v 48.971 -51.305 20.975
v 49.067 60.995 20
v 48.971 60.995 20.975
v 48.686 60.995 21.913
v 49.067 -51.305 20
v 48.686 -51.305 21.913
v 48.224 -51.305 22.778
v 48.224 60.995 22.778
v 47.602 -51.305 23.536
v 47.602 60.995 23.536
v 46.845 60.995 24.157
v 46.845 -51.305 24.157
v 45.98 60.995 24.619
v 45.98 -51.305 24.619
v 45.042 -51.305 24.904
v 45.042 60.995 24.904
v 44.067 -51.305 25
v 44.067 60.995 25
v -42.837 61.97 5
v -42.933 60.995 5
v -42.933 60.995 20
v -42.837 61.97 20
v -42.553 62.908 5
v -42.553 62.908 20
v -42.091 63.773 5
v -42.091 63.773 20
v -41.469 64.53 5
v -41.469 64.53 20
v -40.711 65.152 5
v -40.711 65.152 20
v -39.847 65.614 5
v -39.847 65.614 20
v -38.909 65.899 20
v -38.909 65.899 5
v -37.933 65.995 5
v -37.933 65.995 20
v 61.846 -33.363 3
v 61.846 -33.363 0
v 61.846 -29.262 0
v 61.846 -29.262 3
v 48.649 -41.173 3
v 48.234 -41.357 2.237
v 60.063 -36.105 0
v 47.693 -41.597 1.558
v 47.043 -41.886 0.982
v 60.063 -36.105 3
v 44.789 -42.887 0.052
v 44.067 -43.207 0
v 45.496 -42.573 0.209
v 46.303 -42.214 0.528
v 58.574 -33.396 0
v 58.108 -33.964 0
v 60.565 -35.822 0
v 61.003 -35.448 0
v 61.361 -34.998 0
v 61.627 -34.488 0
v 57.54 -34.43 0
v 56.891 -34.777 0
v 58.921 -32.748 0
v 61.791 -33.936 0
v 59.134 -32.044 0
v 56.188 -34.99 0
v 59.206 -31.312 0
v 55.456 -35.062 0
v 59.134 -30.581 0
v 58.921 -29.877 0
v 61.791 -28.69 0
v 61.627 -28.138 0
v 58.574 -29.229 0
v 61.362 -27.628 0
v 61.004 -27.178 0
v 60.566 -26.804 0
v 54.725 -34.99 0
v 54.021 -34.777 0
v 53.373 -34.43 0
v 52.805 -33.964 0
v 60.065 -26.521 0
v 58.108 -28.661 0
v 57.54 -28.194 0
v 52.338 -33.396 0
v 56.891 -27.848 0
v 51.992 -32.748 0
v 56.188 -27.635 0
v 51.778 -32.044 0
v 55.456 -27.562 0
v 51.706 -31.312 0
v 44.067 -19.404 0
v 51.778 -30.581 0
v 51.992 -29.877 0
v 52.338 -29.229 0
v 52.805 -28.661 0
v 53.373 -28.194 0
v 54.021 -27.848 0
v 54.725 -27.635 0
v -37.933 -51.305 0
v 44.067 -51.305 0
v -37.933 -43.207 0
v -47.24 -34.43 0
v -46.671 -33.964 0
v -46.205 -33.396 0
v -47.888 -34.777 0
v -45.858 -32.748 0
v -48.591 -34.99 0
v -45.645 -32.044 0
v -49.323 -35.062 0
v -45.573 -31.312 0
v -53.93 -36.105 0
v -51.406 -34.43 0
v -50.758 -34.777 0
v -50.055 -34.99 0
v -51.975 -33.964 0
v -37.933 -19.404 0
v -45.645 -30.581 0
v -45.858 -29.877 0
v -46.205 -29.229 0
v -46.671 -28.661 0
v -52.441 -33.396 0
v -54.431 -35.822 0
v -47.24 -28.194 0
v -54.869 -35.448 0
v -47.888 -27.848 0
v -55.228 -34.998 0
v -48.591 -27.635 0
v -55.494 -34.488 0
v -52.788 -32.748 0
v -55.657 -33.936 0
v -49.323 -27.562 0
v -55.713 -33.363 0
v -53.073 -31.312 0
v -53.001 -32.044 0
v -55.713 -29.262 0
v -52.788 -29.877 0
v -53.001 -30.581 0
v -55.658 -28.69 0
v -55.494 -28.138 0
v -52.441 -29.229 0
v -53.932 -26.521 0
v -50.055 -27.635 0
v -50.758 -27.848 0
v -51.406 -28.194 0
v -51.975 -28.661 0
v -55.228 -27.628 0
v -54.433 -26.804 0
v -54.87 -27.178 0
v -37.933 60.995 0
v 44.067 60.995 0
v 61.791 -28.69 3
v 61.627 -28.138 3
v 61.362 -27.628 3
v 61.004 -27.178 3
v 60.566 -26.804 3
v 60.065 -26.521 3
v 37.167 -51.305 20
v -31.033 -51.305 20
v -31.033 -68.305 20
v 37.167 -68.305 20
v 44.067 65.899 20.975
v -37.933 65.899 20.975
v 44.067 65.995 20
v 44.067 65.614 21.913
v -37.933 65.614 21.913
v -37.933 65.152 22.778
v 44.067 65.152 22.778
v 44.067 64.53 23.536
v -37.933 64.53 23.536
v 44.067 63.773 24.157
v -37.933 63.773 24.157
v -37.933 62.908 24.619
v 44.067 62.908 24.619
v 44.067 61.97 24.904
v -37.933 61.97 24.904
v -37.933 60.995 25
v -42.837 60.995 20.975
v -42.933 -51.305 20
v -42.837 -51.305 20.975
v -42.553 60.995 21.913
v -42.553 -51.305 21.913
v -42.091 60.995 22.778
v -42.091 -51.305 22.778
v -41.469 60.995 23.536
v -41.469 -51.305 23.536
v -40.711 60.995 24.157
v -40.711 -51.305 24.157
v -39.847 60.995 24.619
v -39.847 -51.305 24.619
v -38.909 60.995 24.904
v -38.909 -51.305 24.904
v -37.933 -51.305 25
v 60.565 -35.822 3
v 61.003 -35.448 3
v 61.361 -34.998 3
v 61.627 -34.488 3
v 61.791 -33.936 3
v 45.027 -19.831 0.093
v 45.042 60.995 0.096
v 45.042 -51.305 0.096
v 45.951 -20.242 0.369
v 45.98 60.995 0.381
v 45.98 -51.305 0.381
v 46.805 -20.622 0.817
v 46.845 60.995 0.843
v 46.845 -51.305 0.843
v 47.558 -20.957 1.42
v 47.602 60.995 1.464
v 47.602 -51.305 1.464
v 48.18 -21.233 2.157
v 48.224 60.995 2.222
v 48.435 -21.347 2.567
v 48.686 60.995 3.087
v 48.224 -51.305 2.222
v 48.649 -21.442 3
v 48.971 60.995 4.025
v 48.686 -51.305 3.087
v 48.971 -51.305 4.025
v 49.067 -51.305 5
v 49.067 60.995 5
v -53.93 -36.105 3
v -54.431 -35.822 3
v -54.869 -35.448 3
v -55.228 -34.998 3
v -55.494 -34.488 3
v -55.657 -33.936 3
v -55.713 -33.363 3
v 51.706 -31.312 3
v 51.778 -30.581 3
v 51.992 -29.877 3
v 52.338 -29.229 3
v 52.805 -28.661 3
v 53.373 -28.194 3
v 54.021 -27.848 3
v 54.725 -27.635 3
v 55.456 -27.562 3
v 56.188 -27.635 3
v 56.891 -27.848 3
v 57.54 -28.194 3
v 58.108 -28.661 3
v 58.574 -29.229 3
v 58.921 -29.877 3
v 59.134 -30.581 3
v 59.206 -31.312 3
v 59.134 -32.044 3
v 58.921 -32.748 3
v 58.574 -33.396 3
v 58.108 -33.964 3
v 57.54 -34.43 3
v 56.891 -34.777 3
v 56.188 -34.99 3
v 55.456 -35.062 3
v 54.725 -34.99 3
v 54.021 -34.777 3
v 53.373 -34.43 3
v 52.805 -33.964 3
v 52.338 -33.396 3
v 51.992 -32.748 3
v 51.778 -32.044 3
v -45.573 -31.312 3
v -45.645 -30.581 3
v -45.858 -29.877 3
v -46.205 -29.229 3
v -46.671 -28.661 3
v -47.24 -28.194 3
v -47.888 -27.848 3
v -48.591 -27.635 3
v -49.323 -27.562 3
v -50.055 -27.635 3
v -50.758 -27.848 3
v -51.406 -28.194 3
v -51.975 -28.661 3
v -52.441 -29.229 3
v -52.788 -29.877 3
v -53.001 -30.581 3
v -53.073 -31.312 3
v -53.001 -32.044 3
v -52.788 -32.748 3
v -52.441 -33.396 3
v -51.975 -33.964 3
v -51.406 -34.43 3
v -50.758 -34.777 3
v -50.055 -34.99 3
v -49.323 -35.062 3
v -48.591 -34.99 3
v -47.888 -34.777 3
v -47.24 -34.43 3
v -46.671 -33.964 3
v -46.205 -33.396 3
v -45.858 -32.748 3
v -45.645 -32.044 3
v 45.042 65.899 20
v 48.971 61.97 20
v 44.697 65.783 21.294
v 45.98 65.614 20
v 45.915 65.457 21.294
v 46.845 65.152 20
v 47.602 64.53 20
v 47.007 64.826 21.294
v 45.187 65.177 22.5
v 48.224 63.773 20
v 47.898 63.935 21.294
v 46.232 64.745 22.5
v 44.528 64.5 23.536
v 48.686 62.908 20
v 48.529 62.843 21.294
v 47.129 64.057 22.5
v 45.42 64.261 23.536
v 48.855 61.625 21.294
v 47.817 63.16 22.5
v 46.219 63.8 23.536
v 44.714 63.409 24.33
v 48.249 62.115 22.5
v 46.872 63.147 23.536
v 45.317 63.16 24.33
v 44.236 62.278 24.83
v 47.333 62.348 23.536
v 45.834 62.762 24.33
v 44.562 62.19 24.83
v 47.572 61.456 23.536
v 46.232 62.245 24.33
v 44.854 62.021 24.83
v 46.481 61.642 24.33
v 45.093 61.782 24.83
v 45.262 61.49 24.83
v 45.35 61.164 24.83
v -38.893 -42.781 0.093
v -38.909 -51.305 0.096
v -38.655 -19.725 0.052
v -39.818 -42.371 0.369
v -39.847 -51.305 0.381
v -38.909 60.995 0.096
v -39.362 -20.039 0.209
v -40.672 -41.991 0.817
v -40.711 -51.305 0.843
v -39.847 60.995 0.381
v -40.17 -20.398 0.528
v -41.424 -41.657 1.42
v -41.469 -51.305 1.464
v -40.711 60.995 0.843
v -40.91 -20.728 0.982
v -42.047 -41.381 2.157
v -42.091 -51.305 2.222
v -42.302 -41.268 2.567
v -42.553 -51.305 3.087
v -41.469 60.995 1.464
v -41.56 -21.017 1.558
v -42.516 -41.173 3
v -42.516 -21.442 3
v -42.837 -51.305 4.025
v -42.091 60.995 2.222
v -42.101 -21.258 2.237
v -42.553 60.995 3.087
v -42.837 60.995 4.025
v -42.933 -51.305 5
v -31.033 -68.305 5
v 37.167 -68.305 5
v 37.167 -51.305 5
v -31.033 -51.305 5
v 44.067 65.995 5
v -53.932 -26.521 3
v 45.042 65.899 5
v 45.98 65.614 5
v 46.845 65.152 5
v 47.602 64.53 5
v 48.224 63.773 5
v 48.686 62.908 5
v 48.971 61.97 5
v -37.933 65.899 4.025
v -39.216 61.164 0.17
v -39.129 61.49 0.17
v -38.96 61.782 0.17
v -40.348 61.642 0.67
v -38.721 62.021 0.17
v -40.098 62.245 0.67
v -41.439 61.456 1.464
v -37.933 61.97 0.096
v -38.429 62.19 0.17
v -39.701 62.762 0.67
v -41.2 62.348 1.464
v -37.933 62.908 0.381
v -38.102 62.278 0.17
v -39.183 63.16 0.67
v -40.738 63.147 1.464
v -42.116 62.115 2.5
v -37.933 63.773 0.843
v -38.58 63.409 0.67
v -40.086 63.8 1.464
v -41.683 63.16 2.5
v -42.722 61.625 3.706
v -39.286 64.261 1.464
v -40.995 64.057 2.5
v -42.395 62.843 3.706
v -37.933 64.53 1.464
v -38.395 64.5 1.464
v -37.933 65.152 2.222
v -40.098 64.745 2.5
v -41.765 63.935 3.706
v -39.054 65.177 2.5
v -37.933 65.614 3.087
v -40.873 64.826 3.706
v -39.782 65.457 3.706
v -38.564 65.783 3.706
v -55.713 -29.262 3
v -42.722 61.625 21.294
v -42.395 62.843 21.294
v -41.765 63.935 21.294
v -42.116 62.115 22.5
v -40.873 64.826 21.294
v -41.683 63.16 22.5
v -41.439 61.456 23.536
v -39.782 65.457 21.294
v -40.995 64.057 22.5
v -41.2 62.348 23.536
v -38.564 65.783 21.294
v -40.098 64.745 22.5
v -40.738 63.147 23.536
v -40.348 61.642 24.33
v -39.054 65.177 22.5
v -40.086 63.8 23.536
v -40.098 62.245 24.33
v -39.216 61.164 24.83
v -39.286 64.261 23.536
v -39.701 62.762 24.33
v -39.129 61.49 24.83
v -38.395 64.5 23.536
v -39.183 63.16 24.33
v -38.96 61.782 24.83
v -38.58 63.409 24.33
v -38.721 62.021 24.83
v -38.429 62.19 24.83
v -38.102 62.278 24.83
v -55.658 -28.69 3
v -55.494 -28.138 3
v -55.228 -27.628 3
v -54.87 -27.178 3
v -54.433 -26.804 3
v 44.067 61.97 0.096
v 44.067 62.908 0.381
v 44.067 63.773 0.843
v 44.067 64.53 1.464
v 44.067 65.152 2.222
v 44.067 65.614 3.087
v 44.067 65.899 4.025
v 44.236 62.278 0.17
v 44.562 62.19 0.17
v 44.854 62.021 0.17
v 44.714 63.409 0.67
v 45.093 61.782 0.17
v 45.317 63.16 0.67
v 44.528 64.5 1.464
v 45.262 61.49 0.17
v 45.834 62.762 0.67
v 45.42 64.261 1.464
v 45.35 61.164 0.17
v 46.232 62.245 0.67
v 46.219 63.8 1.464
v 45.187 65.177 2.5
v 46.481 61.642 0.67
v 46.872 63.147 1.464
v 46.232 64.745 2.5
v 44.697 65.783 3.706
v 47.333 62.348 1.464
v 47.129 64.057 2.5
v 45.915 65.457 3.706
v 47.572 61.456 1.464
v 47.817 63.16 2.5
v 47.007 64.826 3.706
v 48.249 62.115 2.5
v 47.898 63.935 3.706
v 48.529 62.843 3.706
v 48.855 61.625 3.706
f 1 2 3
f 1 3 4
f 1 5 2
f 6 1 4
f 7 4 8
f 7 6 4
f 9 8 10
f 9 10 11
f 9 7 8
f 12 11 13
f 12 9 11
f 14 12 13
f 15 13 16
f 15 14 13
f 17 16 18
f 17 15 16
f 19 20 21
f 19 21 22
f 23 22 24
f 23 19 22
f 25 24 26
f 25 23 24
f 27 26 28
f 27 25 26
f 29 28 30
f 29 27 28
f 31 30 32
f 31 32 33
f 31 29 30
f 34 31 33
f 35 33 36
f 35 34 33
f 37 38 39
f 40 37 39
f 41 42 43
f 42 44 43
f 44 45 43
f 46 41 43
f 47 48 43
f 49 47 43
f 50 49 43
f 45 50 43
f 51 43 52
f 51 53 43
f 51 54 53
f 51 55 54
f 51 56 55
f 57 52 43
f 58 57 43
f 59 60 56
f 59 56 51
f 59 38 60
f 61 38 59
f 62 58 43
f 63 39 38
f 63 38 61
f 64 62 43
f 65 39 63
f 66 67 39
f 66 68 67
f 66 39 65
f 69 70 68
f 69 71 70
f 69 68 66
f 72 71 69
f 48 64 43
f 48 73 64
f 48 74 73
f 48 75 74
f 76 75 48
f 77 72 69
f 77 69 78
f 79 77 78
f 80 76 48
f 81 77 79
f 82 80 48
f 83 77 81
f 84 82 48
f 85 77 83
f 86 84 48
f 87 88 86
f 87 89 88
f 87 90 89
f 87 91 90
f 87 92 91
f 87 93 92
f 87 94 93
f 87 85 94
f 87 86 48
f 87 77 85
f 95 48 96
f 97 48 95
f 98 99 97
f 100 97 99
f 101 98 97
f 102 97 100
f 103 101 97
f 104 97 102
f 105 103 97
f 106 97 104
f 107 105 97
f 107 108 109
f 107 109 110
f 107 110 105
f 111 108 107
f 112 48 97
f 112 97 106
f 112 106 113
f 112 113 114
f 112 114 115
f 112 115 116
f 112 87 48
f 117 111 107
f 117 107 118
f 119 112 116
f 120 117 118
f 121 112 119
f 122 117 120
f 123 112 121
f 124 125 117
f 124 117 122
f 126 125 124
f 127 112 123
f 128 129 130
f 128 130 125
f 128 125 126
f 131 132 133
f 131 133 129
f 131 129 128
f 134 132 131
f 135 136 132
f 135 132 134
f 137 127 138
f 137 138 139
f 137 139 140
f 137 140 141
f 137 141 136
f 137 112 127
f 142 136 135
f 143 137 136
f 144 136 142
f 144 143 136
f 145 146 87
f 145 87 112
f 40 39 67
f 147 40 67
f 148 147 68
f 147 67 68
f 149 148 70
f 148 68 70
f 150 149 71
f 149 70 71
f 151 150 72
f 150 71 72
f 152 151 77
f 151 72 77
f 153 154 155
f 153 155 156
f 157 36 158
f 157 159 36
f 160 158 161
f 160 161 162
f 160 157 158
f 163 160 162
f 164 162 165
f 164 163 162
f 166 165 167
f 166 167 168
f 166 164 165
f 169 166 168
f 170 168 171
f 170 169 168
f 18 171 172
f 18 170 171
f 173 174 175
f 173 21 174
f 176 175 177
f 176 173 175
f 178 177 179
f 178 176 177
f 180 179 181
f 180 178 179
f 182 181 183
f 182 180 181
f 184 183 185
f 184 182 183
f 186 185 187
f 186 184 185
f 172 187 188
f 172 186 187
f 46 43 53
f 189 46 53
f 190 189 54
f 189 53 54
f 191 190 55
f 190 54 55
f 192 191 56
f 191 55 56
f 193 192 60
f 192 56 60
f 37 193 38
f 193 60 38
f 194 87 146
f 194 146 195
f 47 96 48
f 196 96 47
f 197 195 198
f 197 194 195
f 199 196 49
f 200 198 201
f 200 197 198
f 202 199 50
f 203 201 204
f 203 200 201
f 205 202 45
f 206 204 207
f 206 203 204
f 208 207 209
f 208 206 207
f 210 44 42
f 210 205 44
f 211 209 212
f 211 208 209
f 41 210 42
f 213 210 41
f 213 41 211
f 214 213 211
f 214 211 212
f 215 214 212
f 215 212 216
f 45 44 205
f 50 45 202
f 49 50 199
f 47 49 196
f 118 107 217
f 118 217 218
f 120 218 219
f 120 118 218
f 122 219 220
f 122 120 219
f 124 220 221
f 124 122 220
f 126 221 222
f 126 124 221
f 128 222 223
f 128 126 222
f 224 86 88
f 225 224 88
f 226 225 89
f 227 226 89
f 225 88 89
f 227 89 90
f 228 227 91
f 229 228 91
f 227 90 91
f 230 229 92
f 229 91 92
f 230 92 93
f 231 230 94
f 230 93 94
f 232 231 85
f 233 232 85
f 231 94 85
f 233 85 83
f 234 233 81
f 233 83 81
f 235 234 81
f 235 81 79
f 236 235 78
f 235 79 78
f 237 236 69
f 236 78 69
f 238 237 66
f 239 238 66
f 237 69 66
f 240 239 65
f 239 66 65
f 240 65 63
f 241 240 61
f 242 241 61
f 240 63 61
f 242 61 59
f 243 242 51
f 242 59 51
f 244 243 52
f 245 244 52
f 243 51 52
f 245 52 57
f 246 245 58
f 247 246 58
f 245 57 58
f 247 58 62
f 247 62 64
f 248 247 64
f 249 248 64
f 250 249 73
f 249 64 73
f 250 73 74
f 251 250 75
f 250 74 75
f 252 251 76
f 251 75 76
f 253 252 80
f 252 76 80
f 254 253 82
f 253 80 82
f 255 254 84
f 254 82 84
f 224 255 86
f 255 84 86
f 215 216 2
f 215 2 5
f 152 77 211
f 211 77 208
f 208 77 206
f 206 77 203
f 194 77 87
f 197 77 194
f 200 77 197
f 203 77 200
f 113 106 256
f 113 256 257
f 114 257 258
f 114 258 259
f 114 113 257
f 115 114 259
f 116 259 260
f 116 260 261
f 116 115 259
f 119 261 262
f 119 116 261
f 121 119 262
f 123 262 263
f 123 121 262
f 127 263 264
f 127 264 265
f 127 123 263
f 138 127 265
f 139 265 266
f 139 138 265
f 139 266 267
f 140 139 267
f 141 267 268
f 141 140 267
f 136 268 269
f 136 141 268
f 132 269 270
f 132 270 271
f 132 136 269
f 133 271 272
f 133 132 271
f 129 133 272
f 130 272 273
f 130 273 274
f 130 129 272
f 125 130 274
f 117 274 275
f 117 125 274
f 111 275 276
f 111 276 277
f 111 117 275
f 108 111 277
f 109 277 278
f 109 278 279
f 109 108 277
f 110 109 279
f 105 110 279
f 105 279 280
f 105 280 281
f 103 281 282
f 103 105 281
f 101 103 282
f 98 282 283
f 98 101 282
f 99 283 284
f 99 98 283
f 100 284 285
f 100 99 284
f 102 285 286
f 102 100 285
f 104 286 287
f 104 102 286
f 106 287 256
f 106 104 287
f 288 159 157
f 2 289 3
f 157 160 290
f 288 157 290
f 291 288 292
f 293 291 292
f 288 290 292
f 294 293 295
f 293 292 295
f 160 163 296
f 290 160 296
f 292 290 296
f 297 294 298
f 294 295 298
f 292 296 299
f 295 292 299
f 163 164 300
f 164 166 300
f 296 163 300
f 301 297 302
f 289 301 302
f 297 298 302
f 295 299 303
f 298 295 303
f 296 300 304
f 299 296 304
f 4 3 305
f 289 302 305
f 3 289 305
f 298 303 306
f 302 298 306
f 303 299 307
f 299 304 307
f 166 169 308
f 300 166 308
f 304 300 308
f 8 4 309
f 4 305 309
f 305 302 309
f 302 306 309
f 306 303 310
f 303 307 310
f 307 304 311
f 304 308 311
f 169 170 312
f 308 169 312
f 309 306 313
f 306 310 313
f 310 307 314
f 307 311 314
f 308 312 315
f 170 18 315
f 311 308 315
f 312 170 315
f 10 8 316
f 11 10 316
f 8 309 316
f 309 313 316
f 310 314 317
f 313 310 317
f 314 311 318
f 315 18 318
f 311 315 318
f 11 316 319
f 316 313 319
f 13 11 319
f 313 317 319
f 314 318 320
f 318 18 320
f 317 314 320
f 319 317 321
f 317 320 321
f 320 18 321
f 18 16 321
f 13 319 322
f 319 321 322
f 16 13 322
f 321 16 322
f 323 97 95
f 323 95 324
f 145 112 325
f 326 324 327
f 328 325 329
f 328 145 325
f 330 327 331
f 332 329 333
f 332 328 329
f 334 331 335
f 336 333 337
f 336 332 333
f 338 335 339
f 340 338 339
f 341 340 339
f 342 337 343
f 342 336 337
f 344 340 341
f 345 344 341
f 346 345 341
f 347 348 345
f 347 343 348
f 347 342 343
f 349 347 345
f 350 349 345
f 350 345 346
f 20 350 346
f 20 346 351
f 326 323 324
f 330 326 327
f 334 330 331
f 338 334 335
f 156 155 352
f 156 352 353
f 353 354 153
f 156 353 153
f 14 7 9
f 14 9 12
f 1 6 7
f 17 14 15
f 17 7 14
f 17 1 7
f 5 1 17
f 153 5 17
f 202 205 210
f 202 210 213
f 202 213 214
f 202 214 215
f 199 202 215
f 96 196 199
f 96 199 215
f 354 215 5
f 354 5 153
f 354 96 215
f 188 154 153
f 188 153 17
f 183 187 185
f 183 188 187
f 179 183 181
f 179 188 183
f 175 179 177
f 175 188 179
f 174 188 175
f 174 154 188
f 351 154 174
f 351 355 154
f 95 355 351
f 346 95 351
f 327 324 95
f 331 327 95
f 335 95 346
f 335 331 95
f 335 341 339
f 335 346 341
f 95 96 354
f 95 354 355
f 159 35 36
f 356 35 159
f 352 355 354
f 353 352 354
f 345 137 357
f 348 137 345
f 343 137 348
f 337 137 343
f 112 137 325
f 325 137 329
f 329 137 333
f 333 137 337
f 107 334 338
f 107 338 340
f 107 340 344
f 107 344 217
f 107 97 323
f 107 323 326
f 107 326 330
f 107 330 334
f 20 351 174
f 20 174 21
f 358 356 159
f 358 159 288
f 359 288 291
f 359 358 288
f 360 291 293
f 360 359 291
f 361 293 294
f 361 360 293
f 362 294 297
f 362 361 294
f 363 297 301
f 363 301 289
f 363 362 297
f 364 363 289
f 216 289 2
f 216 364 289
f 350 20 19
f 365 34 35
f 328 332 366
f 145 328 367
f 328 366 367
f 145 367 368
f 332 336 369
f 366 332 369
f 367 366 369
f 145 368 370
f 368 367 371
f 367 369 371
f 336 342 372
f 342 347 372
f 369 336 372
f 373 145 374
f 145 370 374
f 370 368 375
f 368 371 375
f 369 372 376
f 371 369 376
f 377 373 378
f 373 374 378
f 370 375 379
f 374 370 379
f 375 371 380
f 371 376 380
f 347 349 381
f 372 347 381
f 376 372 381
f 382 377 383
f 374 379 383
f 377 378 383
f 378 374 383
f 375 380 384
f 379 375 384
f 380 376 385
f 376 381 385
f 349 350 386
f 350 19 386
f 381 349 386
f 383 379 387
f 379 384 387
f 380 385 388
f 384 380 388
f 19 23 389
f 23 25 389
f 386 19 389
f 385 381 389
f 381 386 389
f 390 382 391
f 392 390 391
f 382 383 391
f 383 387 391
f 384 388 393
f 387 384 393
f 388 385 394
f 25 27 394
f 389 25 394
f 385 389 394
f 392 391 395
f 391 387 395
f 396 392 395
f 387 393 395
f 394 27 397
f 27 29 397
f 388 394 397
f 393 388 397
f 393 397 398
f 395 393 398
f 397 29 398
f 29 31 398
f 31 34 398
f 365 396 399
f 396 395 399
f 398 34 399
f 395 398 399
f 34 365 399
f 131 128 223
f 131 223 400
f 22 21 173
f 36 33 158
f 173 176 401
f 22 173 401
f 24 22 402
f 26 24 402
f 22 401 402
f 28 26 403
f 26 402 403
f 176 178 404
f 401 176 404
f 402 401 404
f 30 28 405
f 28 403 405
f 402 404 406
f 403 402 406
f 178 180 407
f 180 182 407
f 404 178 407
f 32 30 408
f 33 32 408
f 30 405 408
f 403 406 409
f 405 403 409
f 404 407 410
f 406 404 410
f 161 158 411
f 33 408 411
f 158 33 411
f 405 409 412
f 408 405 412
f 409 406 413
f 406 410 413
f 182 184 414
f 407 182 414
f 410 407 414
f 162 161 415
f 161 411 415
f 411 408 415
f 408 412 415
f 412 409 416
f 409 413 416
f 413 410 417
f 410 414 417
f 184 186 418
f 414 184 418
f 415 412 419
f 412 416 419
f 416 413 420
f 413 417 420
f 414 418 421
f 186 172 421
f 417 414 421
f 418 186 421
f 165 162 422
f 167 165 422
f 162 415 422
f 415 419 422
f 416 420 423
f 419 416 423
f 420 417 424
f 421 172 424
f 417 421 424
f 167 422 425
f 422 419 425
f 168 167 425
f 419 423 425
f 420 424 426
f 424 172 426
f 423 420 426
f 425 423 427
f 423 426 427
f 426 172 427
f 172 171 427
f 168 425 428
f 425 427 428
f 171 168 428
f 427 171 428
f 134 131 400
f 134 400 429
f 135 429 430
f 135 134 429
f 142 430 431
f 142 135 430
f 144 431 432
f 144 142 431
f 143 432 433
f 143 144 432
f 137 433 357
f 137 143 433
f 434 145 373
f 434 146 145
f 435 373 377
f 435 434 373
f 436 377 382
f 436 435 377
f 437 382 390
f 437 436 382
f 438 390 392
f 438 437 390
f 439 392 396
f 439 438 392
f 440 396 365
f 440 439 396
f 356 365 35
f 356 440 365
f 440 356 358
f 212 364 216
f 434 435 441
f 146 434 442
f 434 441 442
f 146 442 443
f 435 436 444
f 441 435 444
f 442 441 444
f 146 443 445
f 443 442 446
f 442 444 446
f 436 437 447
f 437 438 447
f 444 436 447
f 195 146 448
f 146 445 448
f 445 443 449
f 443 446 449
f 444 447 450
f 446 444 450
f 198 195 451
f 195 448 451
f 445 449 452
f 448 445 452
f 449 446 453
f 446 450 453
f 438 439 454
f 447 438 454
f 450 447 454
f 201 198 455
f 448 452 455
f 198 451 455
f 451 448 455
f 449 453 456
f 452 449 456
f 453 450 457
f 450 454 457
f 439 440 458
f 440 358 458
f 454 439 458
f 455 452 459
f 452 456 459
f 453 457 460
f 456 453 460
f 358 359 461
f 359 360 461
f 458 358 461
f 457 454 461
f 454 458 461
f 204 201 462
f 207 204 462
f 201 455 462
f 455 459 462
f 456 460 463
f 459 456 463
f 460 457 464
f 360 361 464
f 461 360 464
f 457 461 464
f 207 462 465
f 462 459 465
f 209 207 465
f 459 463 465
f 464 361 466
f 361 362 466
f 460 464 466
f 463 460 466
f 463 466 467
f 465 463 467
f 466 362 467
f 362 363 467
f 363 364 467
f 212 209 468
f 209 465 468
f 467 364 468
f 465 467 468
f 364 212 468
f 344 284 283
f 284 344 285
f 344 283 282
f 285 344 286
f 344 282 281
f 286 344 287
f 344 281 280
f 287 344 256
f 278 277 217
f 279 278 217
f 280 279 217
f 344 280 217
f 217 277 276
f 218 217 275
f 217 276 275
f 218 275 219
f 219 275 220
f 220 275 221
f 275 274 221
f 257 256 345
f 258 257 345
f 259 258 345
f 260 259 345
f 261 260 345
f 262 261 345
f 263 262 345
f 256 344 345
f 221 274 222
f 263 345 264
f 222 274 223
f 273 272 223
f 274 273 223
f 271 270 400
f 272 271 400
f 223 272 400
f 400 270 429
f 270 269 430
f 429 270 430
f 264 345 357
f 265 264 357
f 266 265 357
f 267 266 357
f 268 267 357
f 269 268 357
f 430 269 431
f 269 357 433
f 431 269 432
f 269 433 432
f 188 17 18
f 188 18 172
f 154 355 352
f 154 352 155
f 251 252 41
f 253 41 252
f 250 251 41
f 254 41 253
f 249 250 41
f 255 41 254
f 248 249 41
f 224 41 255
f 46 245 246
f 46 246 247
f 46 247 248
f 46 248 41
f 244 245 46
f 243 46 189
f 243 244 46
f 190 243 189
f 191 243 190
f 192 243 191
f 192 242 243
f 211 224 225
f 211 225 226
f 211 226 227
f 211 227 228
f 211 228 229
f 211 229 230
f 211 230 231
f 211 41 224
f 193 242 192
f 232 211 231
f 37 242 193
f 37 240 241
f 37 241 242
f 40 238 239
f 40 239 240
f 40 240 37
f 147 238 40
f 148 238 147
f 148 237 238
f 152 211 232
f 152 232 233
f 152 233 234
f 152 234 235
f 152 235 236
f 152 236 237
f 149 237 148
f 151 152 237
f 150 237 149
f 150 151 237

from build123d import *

# Parameters (mm, degrees)
EXTRUDE_1_DEPTH = 25
FILLET_2_R      = 5
FILLET_3_R      = 5
SKETCH_2_W      = 68.2
SKETCH_2_H      = 15
EXTRUDE_2_DEPTH = 17
SKETCH_3_R      = 3.75
EXTRUDE_3_DEPTH = 3


with BuildPart() as part:
    # 草图1 → 凸台-拉伸1 (new body)
    with BuildSketch(Plane.XY):
        with BuildLine():
            Line((-37.933333333, 65.994666667), (44.066666667, 65.994666667))
            ThreePointArc((44.066666667, 65.994666667), (47.602200573, 64.530200573), (49.066666667, 60.994666667))
            Line((49.066666667, 60.994666667), (49.066666667, -51.305333333))
            Line((49.066666667, -51.305333333), (-42.933333333, -51.305333333))
            Line((-42.933333333, -51.305333333), (-42.933333333, 60.994666667))
            ThreePointArc((-42.933333333, 60.994666667), (-41.468867239, 64.530200573), (-37.933333333, 65.994666667))
        make_face()
    extrude(amount=EXTRUDE_1_DEPTH)

    # 圆角2
    fillet_2_edges = [part.edges().sort_by_distance(p)[0] for p in [
        (47.602200573, 64.530200573, 25),
        (49.066666667, 4.844666667, 25),
        (-42.933333333, 4.844666667, 25),
        (-41.468867239, 64.530200573, 25),
        (3.066666667, 65.994666667, 25),
    ]]
    fillet(fillet_2_edges, radius=FILLET_2_R)

    # 圆角3
    fillet_3_edges = [part.edges().sort_by_distance(p)[0] for p in [
        (-42.933333333, 4.844666667, 0),
        (49.066666667, 4.844666667, 0),
        (47.602200573, 64.530200573, 0),
        (3.066666667, 65.994666667, 0),
        (-41.468867239, 64.530200573, 0),
    ]]
    fillet(fillet_3_edges, radius=FILLET_3_R)

    # 草图2 → 凸台-拉伸2 (add)
    with BuildSketch(Plane.XZ.offset(51.305333333)):
        with Locations((3.066666667, 12.5)):
            Rectangle(SKETCH_2_W, SKETCH_2_H)
    extrude(amount=EXTRUDE_2_DEPTH)

    # 草图3 → 凸台-拉伸3 (add)
    with BuildSketch(Plane(origin=(0, 0, 0), x_dir=(-1, 0, 0), z_dir=(0, 0, -1))):
        with BuildLine():
            Line((-60.065426781, -26.521117388), (-43.846003667, -19.305333333))
            Line((-43.846003667, -19.305333333), (-43.846003667, -31.305333333))
            Line((-43.846003667, -31.305333333), (-43.846003667, -43.305333333))
            Line((-43.846003667, -43.305333333), (-60.063408173, -36.104747529))
            ThreePointArc((-60.063408173, -36.104747529), (-61.361177964, -34.998068142), (-61.846002246, -33.362864452))
            Line((-61.846002246, -33.362864452), (-61.846002246, -29.262103306))
            ThreePointArc((-61.846002246, -29.262103306), (-61.36177982, -27.62782573), (-60.065426781, -26.521117388))
        make_face()
        with Locations((-55.456334457, -31.312483879)):
            Circle(SKETCH_3_R, mode=Mode.SUBTRACT)
    extrude_3 = extrude(amount=-EXTRUDE_3_DEPTH)

    # 镜向1: 凸台-拉伸3 across plane
    add(extrude_3.mirror(Plane(origin=(3.066666667, 0, 0), x_dir=(0, 0, 1), z_dir=(1, 0, 0))))


solid = part.part
